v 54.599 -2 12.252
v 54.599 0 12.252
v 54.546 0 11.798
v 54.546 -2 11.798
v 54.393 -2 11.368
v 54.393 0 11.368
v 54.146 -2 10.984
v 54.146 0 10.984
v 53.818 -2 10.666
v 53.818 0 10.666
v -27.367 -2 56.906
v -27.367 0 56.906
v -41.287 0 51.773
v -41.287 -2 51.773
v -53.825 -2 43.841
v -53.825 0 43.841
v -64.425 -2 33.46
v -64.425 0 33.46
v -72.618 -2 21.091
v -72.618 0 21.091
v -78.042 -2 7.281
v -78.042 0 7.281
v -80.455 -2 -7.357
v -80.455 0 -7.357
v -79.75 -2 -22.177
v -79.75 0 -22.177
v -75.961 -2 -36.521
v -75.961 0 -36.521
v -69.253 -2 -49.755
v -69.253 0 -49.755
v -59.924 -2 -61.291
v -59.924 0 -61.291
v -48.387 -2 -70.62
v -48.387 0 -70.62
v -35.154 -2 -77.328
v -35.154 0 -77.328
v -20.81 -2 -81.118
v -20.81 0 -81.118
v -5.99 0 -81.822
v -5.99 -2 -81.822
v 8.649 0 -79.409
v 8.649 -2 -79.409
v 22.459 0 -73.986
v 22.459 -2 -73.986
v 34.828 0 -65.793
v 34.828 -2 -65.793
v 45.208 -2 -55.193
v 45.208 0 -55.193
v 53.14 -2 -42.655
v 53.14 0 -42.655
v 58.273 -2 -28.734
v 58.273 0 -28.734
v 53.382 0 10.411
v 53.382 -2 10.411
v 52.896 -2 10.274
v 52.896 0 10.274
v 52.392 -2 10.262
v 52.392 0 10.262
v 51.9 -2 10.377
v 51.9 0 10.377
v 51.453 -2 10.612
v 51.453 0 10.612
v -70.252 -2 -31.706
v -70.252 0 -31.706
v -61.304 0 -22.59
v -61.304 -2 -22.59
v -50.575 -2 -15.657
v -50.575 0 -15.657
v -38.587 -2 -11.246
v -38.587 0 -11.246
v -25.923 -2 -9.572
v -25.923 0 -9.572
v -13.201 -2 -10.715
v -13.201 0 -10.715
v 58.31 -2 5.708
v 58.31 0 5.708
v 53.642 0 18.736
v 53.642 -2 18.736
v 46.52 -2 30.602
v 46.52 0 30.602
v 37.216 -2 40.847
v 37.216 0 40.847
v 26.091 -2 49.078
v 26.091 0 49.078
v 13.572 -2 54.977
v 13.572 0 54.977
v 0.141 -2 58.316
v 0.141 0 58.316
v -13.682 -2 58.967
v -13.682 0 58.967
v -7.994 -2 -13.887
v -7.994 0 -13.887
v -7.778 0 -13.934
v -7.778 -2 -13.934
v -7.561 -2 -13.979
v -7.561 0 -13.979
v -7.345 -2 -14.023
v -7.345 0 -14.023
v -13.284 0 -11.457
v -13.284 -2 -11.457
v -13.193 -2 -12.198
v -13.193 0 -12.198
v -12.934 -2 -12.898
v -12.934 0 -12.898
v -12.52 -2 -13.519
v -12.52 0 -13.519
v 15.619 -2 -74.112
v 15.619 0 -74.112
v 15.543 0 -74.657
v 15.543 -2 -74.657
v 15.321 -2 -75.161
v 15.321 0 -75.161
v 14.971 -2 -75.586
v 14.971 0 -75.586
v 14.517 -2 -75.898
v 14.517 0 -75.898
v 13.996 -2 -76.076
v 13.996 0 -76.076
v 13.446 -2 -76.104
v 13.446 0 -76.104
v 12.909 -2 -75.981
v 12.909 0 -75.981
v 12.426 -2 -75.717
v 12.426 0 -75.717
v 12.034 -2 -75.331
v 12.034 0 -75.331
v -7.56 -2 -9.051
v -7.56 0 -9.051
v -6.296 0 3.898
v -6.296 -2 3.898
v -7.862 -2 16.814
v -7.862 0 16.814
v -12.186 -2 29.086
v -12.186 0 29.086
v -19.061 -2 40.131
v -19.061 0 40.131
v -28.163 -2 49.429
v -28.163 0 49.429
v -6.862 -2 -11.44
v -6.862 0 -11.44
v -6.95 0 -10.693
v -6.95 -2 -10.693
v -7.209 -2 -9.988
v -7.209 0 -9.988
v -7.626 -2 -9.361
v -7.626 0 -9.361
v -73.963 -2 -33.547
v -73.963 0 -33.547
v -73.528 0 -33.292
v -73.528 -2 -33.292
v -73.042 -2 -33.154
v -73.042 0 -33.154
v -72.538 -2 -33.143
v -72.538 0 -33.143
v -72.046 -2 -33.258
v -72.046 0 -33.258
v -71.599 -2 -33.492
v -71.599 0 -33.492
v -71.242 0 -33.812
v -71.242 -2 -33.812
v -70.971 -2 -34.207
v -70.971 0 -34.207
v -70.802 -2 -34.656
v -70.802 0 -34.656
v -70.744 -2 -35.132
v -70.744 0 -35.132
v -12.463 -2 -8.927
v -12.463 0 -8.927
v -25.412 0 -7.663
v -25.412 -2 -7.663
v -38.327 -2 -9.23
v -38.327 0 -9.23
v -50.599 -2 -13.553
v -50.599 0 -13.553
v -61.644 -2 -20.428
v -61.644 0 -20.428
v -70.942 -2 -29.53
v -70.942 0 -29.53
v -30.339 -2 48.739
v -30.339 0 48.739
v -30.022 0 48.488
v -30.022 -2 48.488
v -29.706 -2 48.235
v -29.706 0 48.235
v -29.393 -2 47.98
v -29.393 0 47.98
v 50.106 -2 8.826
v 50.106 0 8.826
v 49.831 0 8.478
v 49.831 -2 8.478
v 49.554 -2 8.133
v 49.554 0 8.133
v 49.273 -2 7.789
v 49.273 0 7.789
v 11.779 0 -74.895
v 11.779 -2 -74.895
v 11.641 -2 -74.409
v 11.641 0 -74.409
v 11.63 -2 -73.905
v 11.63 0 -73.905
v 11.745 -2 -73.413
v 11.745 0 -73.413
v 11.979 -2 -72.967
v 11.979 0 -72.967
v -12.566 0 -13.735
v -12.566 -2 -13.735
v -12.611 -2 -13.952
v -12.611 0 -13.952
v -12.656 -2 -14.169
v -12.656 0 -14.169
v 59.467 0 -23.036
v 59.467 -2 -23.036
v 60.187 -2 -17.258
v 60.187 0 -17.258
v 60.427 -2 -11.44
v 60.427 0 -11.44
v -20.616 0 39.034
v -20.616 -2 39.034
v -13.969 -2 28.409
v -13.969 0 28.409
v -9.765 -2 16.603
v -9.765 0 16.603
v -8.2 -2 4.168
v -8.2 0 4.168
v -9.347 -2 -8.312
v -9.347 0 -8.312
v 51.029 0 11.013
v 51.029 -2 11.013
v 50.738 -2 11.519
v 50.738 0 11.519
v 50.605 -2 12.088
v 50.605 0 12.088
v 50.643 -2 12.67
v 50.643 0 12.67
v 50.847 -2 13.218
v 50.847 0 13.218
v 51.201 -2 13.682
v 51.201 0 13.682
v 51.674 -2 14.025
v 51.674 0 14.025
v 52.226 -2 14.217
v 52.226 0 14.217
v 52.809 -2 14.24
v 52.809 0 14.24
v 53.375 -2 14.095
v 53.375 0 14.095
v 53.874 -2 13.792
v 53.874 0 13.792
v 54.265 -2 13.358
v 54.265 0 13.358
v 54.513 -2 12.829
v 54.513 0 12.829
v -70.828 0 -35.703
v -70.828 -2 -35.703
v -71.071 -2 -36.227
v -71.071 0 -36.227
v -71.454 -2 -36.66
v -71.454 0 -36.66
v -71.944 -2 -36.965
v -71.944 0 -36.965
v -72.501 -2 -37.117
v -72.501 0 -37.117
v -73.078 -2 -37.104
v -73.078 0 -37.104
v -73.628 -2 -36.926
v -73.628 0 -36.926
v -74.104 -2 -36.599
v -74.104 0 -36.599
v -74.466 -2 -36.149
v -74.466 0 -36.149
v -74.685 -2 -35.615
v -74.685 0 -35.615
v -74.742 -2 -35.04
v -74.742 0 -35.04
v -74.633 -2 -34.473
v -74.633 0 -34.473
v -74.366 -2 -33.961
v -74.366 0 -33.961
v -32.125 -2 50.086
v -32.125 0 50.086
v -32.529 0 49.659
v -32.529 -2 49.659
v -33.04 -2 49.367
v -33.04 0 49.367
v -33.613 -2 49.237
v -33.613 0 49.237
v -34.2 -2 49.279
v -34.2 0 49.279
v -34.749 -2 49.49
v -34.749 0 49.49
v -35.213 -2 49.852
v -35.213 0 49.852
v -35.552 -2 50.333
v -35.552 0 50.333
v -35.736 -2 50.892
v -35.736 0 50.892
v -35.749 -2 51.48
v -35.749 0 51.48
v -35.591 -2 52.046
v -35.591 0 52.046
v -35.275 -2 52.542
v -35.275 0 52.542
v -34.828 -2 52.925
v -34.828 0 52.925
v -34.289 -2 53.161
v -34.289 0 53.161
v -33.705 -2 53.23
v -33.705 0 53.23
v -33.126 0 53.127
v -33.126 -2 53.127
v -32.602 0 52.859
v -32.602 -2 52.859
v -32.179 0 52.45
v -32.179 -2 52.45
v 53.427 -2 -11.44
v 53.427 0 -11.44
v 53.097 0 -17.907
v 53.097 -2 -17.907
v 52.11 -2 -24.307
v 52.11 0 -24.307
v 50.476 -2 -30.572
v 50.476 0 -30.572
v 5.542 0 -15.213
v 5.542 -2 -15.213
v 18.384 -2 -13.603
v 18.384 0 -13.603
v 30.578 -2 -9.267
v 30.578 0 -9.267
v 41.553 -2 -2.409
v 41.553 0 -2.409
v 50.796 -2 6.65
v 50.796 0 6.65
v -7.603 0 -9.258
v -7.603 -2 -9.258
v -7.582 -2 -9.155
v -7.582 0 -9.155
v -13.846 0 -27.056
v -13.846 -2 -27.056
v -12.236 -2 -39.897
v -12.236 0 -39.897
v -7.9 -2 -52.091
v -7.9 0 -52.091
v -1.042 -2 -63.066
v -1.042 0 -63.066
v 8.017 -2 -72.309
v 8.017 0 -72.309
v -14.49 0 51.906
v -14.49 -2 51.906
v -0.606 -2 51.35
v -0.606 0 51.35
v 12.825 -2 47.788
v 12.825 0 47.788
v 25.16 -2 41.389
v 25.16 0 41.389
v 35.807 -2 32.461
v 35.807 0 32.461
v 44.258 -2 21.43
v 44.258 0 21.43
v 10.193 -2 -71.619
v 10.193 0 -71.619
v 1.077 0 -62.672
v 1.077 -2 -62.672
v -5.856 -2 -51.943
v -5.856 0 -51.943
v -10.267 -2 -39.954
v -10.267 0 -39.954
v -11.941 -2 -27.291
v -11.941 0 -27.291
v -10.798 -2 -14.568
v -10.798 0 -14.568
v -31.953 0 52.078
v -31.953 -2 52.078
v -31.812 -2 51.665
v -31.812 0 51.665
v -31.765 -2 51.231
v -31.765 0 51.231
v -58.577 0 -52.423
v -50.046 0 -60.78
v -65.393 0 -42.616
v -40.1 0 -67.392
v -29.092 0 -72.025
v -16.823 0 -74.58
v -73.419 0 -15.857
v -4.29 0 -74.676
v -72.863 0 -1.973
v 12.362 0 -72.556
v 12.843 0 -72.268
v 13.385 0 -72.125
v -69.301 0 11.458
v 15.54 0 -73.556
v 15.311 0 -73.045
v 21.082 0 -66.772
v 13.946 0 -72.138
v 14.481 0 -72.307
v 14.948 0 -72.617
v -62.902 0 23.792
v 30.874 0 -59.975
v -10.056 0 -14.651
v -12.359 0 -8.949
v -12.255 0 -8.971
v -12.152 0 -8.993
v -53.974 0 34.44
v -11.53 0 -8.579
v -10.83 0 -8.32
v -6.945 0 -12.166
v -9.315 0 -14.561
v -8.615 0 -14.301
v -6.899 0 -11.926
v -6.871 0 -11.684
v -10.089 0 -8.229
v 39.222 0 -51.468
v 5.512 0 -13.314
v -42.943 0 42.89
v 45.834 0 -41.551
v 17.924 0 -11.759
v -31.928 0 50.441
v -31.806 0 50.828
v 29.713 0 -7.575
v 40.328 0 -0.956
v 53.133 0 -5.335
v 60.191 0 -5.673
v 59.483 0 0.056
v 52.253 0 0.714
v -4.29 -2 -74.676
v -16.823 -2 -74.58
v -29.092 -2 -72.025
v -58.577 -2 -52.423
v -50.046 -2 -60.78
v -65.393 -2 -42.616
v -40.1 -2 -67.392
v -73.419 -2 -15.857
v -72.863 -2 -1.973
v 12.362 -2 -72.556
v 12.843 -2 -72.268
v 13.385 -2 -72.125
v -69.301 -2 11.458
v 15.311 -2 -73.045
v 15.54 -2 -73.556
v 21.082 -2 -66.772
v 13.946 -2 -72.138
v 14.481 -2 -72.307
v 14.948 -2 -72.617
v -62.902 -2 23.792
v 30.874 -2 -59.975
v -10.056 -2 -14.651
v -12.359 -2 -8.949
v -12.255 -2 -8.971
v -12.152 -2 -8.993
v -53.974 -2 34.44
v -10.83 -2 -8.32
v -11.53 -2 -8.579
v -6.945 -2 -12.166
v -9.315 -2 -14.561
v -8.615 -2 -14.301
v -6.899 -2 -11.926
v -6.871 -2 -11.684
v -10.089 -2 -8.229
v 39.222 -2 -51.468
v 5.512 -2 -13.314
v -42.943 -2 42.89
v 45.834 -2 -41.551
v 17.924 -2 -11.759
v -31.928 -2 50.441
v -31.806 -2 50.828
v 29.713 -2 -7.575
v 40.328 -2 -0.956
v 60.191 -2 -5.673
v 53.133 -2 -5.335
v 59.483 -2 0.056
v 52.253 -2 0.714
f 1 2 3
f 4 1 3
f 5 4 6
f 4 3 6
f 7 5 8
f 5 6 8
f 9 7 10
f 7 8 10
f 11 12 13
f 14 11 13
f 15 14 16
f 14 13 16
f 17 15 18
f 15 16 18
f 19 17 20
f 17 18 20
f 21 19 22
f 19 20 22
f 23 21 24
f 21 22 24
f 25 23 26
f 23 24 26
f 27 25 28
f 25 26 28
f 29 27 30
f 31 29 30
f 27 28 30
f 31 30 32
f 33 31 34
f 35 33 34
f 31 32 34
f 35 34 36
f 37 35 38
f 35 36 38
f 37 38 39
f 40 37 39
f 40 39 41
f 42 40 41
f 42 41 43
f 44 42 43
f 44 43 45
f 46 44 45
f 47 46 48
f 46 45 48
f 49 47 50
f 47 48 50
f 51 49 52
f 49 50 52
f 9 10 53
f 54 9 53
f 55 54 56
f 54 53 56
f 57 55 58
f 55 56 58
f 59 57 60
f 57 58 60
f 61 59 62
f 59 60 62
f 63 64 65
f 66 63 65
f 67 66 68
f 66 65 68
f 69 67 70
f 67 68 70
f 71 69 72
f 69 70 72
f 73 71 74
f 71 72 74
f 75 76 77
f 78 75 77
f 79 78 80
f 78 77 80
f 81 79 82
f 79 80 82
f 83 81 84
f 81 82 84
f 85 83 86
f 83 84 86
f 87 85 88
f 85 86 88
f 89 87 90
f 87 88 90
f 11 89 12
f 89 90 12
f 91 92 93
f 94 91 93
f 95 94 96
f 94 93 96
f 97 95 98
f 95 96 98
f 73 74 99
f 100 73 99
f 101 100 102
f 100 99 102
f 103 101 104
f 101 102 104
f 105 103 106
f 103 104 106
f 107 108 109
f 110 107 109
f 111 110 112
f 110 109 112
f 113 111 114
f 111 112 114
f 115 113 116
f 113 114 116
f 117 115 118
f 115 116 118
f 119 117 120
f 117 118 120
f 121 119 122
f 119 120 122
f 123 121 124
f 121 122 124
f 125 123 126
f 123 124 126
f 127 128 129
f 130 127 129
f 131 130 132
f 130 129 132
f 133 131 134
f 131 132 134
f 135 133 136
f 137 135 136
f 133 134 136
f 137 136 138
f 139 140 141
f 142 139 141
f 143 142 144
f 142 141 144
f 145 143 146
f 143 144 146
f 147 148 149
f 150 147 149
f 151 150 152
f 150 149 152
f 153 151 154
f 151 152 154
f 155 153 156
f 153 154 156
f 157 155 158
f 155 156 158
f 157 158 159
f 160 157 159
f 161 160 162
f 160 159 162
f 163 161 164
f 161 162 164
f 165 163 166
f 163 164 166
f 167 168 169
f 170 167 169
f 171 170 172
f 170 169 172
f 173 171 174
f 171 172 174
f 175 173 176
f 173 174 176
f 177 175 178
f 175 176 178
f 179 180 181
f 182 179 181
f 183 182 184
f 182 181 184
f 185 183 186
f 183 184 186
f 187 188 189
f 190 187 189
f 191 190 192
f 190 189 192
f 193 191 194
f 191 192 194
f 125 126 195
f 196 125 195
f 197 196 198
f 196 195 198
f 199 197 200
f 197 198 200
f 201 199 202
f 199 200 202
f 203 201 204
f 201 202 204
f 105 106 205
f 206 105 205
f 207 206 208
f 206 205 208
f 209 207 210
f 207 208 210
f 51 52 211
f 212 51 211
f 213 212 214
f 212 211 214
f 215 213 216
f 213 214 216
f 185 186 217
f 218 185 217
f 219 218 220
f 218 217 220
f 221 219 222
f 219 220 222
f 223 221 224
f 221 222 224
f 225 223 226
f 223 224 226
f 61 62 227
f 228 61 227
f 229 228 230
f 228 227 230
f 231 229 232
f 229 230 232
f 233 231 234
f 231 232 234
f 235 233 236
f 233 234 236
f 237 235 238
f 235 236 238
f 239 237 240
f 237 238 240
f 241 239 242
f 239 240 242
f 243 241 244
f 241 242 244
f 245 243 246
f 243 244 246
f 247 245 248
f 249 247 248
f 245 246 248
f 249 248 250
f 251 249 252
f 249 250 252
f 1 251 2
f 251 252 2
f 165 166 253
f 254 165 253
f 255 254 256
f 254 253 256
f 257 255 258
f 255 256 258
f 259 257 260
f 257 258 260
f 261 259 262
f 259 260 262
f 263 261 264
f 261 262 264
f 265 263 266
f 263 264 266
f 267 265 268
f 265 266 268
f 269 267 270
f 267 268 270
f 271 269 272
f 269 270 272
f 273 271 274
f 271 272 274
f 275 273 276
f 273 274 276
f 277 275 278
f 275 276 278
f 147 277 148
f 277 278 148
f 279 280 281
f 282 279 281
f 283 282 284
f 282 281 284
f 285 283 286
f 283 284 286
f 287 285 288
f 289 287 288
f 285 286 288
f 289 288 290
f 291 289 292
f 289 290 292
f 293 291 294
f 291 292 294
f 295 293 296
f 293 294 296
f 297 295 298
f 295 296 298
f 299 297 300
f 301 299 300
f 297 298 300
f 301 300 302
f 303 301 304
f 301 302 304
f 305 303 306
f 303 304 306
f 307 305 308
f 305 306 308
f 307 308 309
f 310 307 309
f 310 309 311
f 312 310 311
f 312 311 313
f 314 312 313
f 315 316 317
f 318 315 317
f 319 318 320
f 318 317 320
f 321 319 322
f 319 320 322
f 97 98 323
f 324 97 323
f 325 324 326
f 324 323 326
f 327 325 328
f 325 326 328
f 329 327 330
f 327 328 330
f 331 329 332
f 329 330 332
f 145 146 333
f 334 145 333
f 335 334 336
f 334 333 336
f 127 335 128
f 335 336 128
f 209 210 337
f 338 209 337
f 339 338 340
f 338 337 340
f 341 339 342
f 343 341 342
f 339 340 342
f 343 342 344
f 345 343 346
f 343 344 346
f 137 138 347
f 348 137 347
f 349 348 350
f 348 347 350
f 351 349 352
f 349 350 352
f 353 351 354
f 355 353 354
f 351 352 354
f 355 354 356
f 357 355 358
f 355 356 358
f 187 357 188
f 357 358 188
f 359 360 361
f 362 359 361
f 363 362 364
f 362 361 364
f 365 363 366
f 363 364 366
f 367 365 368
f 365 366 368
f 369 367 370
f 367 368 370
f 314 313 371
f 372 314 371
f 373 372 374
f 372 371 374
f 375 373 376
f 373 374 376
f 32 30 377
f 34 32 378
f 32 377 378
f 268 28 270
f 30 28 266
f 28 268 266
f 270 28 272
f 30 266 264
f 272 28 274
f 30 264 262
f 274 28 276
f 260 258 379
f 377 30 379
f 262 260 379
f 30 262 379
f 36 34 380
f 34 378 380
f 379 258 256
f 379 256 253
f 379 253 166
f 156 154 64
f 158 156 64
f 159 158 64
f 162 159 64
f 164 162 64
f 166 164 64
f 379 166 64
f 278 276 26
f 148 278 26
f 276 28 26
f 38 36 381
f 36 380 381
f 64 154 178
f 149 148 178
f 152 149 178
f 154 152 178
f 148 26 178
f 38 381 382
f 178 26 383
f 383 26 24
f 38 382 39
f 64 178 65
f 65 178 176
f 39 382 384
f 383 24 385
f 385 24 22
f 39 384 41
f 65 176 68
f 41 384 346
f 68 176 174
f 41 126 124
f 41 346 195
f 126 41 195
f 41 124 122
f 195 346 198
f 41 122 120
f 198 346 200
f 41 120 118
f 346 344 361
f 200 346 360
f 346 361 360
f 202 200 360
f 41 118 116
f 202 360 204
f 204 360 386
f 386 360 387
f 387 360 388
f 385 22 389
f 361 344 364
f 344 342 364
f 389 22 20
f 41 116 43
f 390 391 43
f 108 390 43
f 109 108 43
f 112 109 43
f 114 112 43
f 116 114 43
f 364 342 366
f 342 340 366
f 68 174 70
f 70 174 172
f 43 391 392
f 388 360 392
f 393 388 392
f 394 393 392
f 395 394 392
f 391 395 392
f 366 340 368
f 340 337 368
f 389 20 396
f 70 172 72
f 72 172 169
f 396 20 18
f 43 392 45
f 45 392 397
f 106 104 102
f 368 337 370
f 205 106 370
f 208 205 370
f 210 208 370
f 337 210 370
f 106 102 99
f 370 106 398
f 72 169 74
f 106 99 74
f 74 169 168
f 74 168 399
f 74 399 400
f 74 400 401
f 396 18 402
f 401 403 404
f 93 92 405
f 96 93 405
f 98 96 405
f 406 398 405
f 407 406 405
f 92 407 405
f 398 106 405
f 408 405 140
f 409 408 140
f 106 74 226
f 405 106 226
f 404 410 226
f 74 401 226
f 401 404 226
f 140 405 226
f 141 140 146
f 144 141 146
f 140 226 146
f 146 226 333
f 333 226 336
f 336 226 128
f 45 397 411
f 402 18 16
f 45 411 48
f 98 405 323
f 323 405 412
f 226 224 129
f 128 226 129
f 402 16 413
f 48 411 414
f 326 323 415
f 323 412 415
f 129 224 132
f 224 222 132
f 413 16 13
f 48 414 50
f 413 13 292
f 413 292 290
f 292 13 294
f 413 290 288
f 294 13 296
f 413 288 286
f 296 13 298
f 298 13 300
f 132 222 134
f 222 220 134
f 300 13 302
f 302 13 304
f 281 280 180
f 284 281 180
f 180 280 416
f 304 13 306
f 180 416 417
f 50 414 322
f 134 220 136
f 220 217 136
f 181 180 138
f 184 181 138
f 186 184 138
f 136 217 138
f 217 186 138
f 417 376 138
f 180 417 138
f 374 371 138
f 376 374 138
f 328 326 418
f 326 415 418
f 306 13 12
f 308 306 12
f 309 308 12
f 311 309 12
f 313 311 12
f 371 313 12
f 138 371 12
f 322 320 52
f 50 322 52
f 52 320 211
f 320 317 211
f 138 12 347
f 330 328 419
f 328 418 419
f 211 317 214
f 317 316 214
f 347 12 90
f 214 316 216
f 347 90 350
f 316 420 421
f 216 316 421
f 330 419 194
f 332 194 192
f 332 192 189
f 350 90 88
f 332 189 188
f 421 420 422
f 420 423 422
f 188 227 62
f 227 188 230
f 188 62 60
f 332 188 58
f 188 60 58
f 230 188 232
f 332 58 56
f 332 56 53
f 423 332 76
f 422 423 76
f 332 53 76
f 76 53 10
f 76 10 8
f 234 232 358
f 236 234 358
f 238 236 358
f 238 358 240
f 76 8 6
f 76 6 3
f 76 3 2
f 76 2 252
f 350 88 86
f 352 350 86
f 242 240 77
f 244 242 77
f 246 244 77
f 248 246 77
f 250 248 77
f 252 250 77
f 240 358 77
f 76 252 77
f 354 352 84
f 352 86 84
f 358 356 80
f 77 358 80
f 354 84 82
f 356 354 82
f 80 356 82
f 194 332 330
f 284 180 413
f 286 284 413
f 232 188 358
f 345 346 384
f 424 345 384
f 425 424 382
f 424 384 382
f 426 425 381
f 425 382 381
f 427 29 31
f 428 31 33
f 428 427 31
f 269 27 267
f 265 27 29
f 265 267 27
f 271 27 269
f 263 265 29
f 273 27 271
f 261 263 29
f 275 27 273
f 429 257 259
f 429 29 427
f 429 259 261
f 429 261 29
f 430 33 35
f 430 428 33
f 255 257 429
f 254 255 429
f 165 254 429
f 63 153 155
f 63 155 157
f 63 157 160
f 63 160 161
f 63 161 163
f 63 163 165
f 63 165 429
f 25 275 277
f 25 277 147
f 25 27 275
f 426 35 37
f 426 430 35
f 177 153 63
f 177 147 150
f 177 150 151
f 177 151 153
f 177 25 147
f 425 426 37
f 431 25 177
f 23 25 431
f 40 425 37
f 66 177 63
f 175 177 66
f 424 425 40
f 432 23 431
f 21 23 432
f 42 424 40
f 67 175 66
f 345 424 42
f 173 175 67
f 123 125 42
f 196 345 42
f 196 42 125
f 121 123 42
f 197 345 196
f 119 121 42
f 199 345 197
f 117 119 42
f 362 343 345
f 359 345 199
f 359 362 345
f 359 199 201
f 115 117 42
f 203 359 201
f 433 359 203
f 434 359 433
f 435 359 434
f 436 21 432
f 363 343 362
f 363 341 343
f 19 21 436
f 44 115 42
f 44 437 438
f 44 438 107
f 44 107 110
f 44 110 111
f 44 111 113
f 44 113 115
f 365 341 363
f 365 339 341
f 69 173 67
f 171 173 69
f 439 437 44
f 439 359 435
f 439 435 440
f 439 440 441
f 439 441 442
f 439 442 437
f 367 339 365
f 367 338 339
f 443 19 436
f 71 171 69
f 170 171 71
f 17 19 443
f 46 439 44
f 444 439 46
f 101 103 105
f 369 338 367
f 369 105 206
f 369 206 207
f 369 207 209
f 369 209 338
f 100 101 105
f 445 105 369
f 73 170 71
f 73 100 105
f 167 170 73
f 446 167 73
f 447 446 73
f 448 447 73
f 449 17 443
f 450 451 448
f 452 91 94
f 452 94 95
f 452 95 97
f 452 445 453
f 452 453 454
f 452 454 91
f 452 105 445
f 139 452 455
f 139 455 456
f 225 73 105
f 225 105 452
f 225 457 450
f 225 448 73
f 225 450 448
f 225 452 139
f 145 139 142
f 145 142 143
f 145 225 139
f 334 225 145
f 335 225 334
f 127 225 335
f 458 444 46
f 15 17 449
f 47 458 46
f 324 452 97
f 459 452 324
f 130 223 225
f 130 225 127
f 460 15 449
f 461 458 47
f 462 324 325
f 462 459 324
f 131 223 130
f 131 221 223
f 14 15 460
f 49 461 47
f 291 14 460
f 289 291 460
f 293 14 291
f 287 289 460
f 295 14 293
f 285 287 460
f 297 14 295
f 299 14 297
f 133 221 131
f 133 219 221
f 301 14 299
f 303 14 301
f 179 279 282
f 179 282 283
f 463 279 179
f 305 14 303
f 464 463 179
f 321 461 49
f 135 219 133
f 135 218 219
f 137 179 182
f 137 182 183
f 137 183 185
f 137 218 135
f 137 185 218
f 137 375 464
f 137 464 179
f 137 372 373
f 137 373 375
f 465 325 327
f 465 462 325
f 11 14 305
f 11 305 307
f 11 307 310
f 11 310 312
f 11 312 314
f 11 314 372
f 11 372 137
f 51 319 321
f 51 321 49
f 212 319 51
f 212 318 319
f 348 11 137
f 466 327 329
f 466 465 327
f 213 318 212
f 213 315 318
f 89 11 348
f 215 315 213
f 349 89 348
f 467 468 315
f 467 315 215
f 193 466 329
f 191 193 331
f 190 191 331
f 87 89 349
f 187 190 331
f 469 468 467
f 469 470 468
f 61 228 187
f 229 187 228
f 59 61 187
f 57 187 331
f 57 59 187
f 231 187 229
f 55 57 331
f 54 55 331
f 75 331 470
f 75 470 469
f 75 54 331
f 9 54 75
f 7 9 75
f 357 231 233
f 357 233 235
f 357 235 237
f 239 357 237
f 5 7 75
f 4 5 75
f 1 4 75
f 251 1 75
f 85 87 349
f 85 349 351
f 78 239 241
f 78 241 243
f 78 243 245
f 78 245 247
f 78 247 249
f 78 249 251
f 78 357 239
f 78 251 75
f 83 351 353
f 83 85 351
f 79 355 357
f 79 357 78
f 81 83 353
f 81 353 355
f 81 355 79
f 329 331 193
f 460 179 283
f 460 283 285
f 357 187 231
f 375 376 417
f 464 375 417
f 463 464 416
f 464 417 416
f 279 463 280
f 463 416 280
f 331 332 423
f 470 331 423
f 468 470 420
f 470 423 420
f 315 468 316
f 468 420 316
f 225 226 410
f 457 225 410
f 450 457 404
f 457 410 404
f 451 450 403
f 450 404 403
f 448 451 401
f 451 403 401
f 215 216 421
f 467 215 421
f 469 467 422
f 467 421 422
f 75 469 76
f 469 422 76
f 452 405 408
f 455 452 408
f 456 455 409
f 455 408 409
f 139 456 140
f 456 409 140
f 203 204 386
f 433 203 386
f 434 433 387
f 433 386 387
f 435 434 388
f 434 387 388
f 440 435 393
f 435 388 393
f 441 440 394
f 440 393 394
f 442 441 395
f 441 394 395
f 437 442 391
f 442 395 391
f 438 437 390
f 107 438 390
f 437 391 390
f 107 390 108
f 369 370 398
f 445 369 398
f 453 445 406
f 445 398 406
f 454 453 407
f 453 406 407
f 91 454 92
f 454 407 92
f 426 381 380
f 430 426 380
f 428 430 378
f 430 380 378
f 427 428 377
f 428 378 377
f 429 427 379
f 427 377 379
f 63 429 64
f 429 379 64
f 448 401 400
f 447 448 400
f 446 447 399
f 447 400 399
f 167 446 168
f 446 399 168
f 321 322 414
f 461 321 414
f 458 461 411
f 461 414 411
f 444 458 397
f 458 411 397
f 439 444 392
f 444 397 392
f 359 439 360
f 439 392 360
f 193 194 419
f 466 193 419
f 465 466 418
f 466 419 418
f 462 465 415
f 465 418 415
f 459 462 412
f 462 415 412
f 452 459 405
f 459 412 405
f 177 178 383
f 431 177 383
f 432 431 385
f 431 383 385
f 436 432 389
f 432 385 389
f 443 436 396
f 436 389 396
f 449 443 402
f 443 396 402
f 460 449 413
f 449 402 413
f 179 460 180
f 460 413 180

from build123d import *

# Parameters (mm, degrees)
F1_DEPTH = 2


# Not quite as in the source:
# - a feature names something its author has since deleted; it is built from what else it names


with BuildPart() as f1:
    # F0 (on Front) → F1 (new body)
    with BuildSketch(Plane.XZ):
        with BuildLine():
            ThreePointArc((-27.3670955133, 56.9056551345), (-80.5728095325, -11.5155179666), (-27.2210675465, -79.822886236))
            ThreePointArc((-27.2210675465, -79.822886236), (-28.2707166424, -75.9512965825), (-29.0922663621, -72.0249718726))
            ThreePointArc((-29.0922663621, -72.0249718726), (-54.5082769695, -56.802573142), (-70.2520814599, -31.7062061045))
            ThreePointArc((-70.2520814599, -31.7062061045), (-70.6313699985, -32.1947433172), (-71.0054179832, -32.6873044899))
            ThreePointArc((-71.0054179832, -32.6873044899), (-70.0780888504, -33.7565825815), (-69.7442063574, -35.1320161272))
            ThreePointArc((-69.7442063574, -35.1320161272), (-74.7859973818, -37.3299900608), (-72.9649326324, -32.1401471609))
            ThreePointArc((-72.9649326324, -32.1401471609), (-71.9713178078, -30.821081237), (-70.9416554734, -29.5299573821))
            ThreePointArc((-70.9416554734, -29.5299573821), (-66.4396950536, 17.8006515976), (-30.3388328071, 48.7390086816))
            ThreePointArc((-30.3388328071, 48.7390086816), (-30.8273700198, 49.1182972202), (-31.3199311925, 49.4923452049))
            ThreePointArc((-31.3199311925, 49.4923452049), (-36.6541110474, 52.0379628175), (-30.7727738636, 51.4518598542))
            ThreePointArc((-30.7727738636, 51.4518598542), (-29.8904735112, 50.7935939017), (-29.0204405195, 50.1191974536))
            ThreePointArc((-29.0204405195, 50.1191974536), (-28.2798956872, 53.5334090749), (-27.3670955133, 56.9056551345))
        make_face()
        with BuildLine():
            ThreePointArc((-29.0922663621, -72.0249718726), (-28.2707166424, -75.9512965825), (-27.2210675465, -79.822886236))
            ThreePointArc((-27.2210675465, -79.822886236), (26.0907604983, -71.958346724), (58.2730284319, -28.7344688106))
            ThreePointArc((58.2730284319, -28.7344688106), (54.4014575958, -29.7669456779), (50.4763758376, -30.5724283969))
            ThreePointArc((50.4763758376, -30.5724283969), (35.2481065637, -55.9178682056), (10.1931333262, -71.6194547573))
            ThreePointArc((10.1931333262, -71.6194547573), (10.6816705389, -71.9987432958), (11.1742317116, -72.3727912805))
            ThreePointArc((11.1742317116, -72.3727912805), (14.5315947304, -71.2537714989), (16.6189433489, -74.1115796548))
            ThreePointArc((16.6189433489, -74.1115796548), (13.7293813431, -77.1095462072), (10.6270743826, -74.3323059298))
            ThreePointArc((10.6270743826, -74.3323059298), (9.3080084587, -73.3386911051), (8.0168846038, -72.3090287708))
            ThreePointArc((8.0168846038, -72.3090287708), (-10.5589046392, -74.9383627794), (-29.0922663621, -72.0249718726))
        make_face()
        with BuildLine():
            ThreePointArc((58.3098134577, 5.7079947682), (26.0907604983, 49.0779006484), (-27.3670955133, 56.9056551345))
            ThreePointArc((-27.3670955133, 56.9056551345), (-28.2798956872, 53.5334090749), (-29.0204405195, 50.1191974536))
            ThreePointArc((-29.0204405195, 50.1191974536), (-28.589922312, 49.7758651019), (-28.1625840847, 49.4285826951))
            ThreePointArc((-28.1625840847, 49.4285826951), (19.1680248949, 44.9266222753), (50.106381979, 8.8257600288))
            ThreePointArc((50.106381979, 8.8257600288), (50.4856705176, 9.3142972415), (50.8597185023, 9.8068584143))
            ThreePointArc((50.8597185023, 9.8068584143), (51.2230733308, 14.9176875586), (55.5985068765, 12.2515700516))
            ThreePointArc((55.5985068765, 12.2515700516), (54.79648081, 10.2097790271), (52.8192331515, 9.2597010853))
            ThreePointArc((52.8192331515, 9.2597010853), (52.1241754763, 8.329073827), (51.4111721259, 7.4121231804))
            ThreePointArc((51.4111721259, 7.4121231804), (54.8825742735, 6.6494490821), (58.3098134577, 5.7079947682))
        make_face()
        with BuildLine():
            ThreePointArc((50.4763758376, -30.5724283969), (54.4014575958, -29.7669456779), (58.2730284319, -28.7344688106))
            ThreePointArc((58.2730284319, -28.7344688106), (59.886547095, -20.1541655683), (60.4271502595, -11.4402230378))
            ThreePointArc((60.4271502595, -11.4402230378), (59.8958138007, -2.8010030346), (58.3098134577, 5.7079947682))
            ThreePointArc((58.3098134577, 5.7079947682), (54.8825742735, 6.6494490821), (51.4111721259, 7.4121231804))
            ThreePointArc((51.4111721259, 7.4121231804), (51.1051261442, 7.0295570743), (50.7959559925, 6.6495113064))
            ThreePointArc((50.7959559925, 6.6495113064), (52.7659088566, -2.3001782907), (53.4271502595, -11.4402230378))
            ThreePointArc((53.4271502595, -11.4402230378), (52.6851211645, -21.1194320912), (50.4763758376, -30.5724283969))
        make_face()
        with BuildLine():
            ThreePointArc((-12.5201116119, -13.51897209), (-12.5889413468, -13.8437334785), (-12.6559669985, -14.1688719933))
            ThreePointArc((-12.6559669985, -14.1688719933), (-12.4731783685, -13.96568891), (-12.2895816621, -13.7632357104))
            ThreePointArc((-12.2895816621, -13.7632357104), (-12.4080426029, -13.6441201736), (-12.5201116119, -13.51897209))
        make_face()
        with BuildLine():
            ThreePointArc((-12.2895816621, -13.7632357104), (-12.4731783685, -13.96568891), (-12.6559669985, -14.1688719933))
            ThreePointArc((-12.6559669985, -14.1688719933), (-10.3985570941, -46.1115999582), (8.0168846038, -72.3090287708))
            ThreePointArc((8.0168846038, -72.3090287708), (9.1081080721, -71.9740223354), (10.1931333262, -71.6194547573))
            ThreePointArc((10.1931333262, -71.6194547573), (-8.3929341527, -46.0705747238), (-10.7982724135, -14.5681696862))
            ThreePointArc((-10.7982724135, -14.5681696862), (-11.5979884526, -14.2658628235), (-12.2895816621, -13.7632357104))
        make_face()
        with BuildLine():
            ThreePointArc((-70.9416554734, -29.5299573821), (-70.606649038, -30.6211808503), (-70.2520814599, -31.7062061045))
            ThreePointArc((-70.2520814599, -31.7062061045), (-44.7032014264, -13.1201386255), (-13.2007963888, -10.7148003648))
            ThreePointArc((-13.2007963888, -10.7148003648), (-12.862086438, -9.8494851792), (-12.2897757069, -9.1173955477))
            ThreePointArc((-12.2897757069, -9.1173955477), (-12.3762338407, -9.022292149), (-12.4625142647, -8.9270274978))
            ThreePointArc((-12.4625142647, -8.9270274978), (-44.5810834921, -11.0567727884), (-70.9416554734, -29.5299573821))
        make_face()
        with BuildLine():
            ThreePointArc((-71.0054179832, -32.6873044899), (-70.6313699985, -32.1947433172), (-70.2520814599, -31.7062061045))
            ThreePointArc((-70.2520814599, -31.7062061045), (-70.606649038, -30.6211808503), (-70.9416554734, -29.5299573821))
            ThreePointArc((-70.9416554734, -29.5299573821), (-71.9713178078, -30.821081237), (-72.9649326324, -32.1401471609))
            ThreePointArc((-72.9649326324, -32.1401471609), (-71.937377119, -32.2425479097), (-71.0054179832, -32.6873044899))
        make_face()
        with BuildLine():
            ThreePointArc((10.1931333262, -71.6194547573), (9.1081080721, -71.9740223354), (8.0168846038, -72.3090287708))
            ThreePointArc((8.0168846038, -72.3090287708), (9.3080084587, -73.3386911051), (10.6270743826, -74.3323059298))
            ThreePointArc((10.6270743826, -74.3323059298), (10.7294751314, -73.3047504164), (11.1742317116, -72.3727912805))
            ThreePointArc((11.1742317116, -72.3727912805), (10.6816705389, -71.9987432958), (10.1931333262, -71.6194547573))
        make_face()
        with BuildLine():
            ThreePointArc((-28.1625840847, 49.4285826951), (-28.589922312, 49.7758651019), (-29.0204405195, 50.1191974536))
            ThreePointArc((-29.0204405195, 50.1191974536), (-29.1146314874, 49.6144442417), (-29.2050550996, 49.1090025402))
            ThreePointArc((-29.2050550996, 49.1090025402), (-28.6845055424, 49.2710301885), (-28.1625840847, 49.4285826951))
        make_face()
        with BuildLine():
            ThreePointArc((-29.2050550996, 49.1090025402), (-29.1146314874, 49.6144442417), (-29.0204405195, 50.1191974536))
            ThreePointArc((-29.0204405195, 50.1191974536), (-29.8904735112, 50.7935939017), (-30.7727738636, 51.4518598542))
            ThreePointArc((-30.7727738636, 51.4518598542), (-30.7666762774, 51.3415715733), (-30.7646428299, 51.2311335791))
            ThreePointArc((-30.7646428299, 51.2311335791), (-30.9068346739, 50.3184821977), (-31.3199311925, 49.4923452049))
            ThreePointArc((-31.3199311925, 49.4923452049), (-30.8273700198, 49.1182972202), (-30.3388328071, 48.7390086816))
            ThreePointArc((-30.3388328071, 48.7390086816), (-29.7728126001, 48.9266674182), (-29.2050550996, 49.1090025402))
        make_face()
        with BuildLine():
            ThreePointArc((50.7959559925, 6.6495113064), (51.1051261442, 7.0295570743), (51.4111721259, 7.4121231804))
            ThreePointArc((51.4111721259, 7.4121231804), (50.9618140768, 7.4971572567), (50.5118990943, 7.5791935838))
            ThreePointArc((50.5118990943, 7.5791935838), (50.6557066113, 7.1148960249), (50.7959559925, 6.6495113064))
        make_face()
        with BuildLine():
            ThreePointArc((50.5118990943, 7.5791935838), (50.9618140768, 7.4971572567), (51.4111721259, 7.4121231804))
            ThreePointArc((51.4111721259, 7.4121231804), (52.1241754763, 8.329073827), (52.8192331515, 9.2597010853))
            ThreePointArc((52.8192331515, 9.2597010853), (51.7916776381, 9.362101834), (50.8597185023, 9.8068584143))
            ThreePointArc((50.8597185023, 9.8068584143), (50.4856705176, 9.3142972415), (50.106381979, 8.8257600288))
            ThreePointArc((50.106381979, 8.8257600288), (50.3123573205, 8.2035232495), (50.5118990943, 7.5791935838))
        make_face()
        with BuildLine():
            ThreePointArc((-12.5201116119, -13.51897209), (-12.4080426029, -13.6441201736), (-12.2895816621, -13.7632357104))
            ThreePointArc((-12.2895816621, -13.7632357104), (-11.1948099524, -12.5887570771), (-10.0728497405, -11.4402230378))
            ThreePointArc((-10.0728497405, -11.4402230378), (-10.9940718567, -11.2075300608), (-11.9189886514, -10.9899866588))
            ThreePointArc((-11.9189886514, -10.9899866588), (-12.2332943861, -12.2512124569), (-12.5201116119, -13.51897209))
        make_face()
        with BuildLine():
            ThreePointArc((-10.0728497405, -11.4402230378), (-11.1948099524, -12.5887570771), (-12.2895816621, -13.7632357104))
            ThreePointArc((-12.2895816621, -13.7632357104), (-11.5979884526, -14.2658628235), (-10.7982724135, -14.5681696862))
            ThreePointArc((-10.7982724135, -14.5681696862), (-10.6643076305, -13.9264868582), (-10.5230861195, -13.2863619488))
            ThreePointArc((-10.5230861195, -13.2863619488), (-10.5381735464, -13.2824253135), (-10.5532599463, -13.2784847442))
            Line((-10.5532599463, -13.2784847442), (-10.0728497405, -11.4402230378))
        make_face()
        with BuildLine():
            ThreePointArc((-13.2007963888, -10.7148003648), (-13.1931994446, -12.1976568722), (-12.5201116119, -13.51897209))
            ThreePointArc((-12.5201116119, -13.51897209), (-12.2332943861, -12.2512124569), (-11.9189886514, -10.9899866588))
            ThreePointArc((-11.9189886514, -10.9899866588), (-12.5591135608, -10.8487651478), (-13.2007963888, -10.7148003648))
        make_face()
        with BuildLine():
            ThreePointArc((-12.2897757069, -9.1173955477), (-12.862086438, -9.8494851792), (-13.2007963888, -10.7148003648))
            ThreePointArc((-13.2007963888, -10.7148003648), (-12.5591135608, -10.8487651478), (-11.9189886514, -10.9899866588))
            ThreePointArc((-11.9189886514, -10.9899866588), (-11.9150520162, -10.9748992319), (-11.9111114468, -10.9598128319))
            Line((-11.9111114468, -10.9598128319), (-10.0728497405, -11.4402230378))
            ThreePointArc((-10.0728497405, -11.4402230378), (-11.1948573752, -10.2917364213), (-12.2897757069, -9.1173955477))
        make_face()
        with BuildLine():
            ThreePointArc((-69.7442063574, -35.1320161272), (-70.0780888504, -33.7565825815), (-71.0054179832, -32.6873044899))
            ThreePointArc((-71.0054179832, -32.6873044899), (-71.3040153489, -33.088497971), (-71.5991359801, -33.4922558304))
            ThreePointArc((-71.5991359801, -33.4922558304), (-70.9707717301, -34.2073920832), (-70.7442063574, -35.1320161272))
            ThreePointArc((-70.7442063574, -35.1320161272), (-73.6278272269, -36.9262329923), (-73.9634205165, -33.5466086609))
            ThreePointArc((-73.9634205165, -33.5466086609), (-73.469248174, -32.839777435), (-72.9649326324, -32.1401471609))
            ThreePointArc((-72.9649326324, -32.1401471609), (-74.7859973818, -37.3299900608), (-69.7442063574, -35.1320161272))
        make_face()
        with BuildLine():
            ThreePointArc((-71.5991359801, -33.4922558304), (-71.3040153489, -33.088497971), (-71.0054179832, -32.6873044899))
            ThreePointArc((-71.0054179832, -32.6873044899), (-71.937377119, -32.2425479097), (-72.9649326324, -32.1401471609))
            ThreePointArc((-72.9649326324, -32.1401471609), (-73.469248174, -32.839777435), (-73.9634205165, -33.5466086609))
            ThreePointArc((-73.9634205165, -33.5466086609), (-72.7901724606, -33.1325444177), (-71.5991359801, -33.4922558304))
        make_face()
        with BuildLine():
            ThreePointArc((11.1742317116, -72.3727912805), (10.7294751314, -73.3047504164), (10.6270743826, -74.3323059298))
            ThreePointArc((10.6270743826, -74.3323059298), (11.3267046567, -74.8366214714), (12.0335358826, -75.3307938138))
            ThreePointArc((12.0335358826, -75.3307938138), (11.6194716394, -74.1575457579), (11.9791830521, -72.9665092775))
            ThreePointArc((11.9791830521, -72.9665092775), (11.5754251927, -72.6713886463), (11.1742317116, -72.3727912805))
        make_face()
        with BuildLine():
            ThreePointArc((12.0335358826, -75.3307938138), (11.3267046567, -74.8366214714), (10.6270743826, -74.3323059298))
            ThreePointArc((10.6270743826, -74.3323059298), (13.7293813431, -77.1095462072), (16.6189433489, -74.1115796548))
            ThreePointArc((16.6189433489, -74.1115796548), (14.5315947304, -71.2537714989), (11.1742317116, -72.3727912805))
            ThreePointArc((11.1742317116, -72.3727912805), (11.5754251927, -72.6713886463), (11.9791830521, -72.9665092775))
            ThreePointArc((11.9791830521, -72.9665092775), (14.2191430683, -72.2037640723), (15.6189433489, -74.1115796548))
            ThreePointArc((15.6189433489, -74.1115796548), (14.2628319524, -76.0050968758), (12.0335358826, -75.3307938138))
        make_face()
        with BuildLine():
            ThreePointArc((-28.1625840847, 49.4285826951), (-28.6845055424, 49.2710301885), (-29.2050550996, 49.1090025402))
            ThreePointArc((-29.2050550996, 49.1090025402), (-29.3013575877, 48.545087408), (-29.3929706411, 47.9803914774))
            ThreePointArc((-29.3929706411, 47.9803914774), (-11.5464019221, 22.6200733478), (-9.3474270674, -8.3122763895))
            ThreePointArc((-9.3474270674, -8.3122763895), (-8.4819953839, -8.6510527838), (-7.7498370678, -9.2234911162))
            ThreePointArc((-7.7498370678, -9.2234911162), (-7.6548806672, -9.1371958925), (-7.5597630163, -9.051078437))
            ThreePointArc((-7.5597630163, -9.051078437), (-9.6893112365, 23.0677602114), (-28.1625840847, 49.4285826951))
        make_face()
        with BuildLine():
            ThreePointArc((-29.3929706411, 47.9803914774), (-29.3013575877, 48.545087408), (-29.2050550996, 49.1090025402))
            ThreePointArc((-29.2050550996, 49.1090025402), (-29.7728126001, 48.9266674182), (-30.3388328071, 48.7390086816))
            ThreePointArc((-30.3388328071, 48.7390086816), (-29.8639157079, 48.3621762923), (-29.3929706411, 47.9803914774))
        make_face()
        with BuildLine():
            ThreePointArc((-30.7646428299, 51.2311335791), (-30.7666762774, 51.3415715733), (-30.7727738636, 51.4518598542))
            ThreePointArc((-30.7727738636, 51.4518598542), (-31.4724041376, 51.9561753958), (-32.1792353635, 52.4503477382))
            ThreePointArc((-32.1792353635, 52.4503477382), (-31.8711256088, 51.8750221826), (-31.7646428299, 51.2311335791))
            ThreePointArc((-31.7646428299, 51.2311335791), (-31.8568272474, 50.6309338597), (-32.124882533, 50.0860632018))
            ThreePointArc((-32.124882533, 50.0860632018), (-31.7211246736, 49.7909425706), (-31.3199311925, 49.4923452049))
            ThreePointArc((-31.3199311925, 49.4923452049), (-30.9068346739, 50.3184821977), (-30.7646428299, 51.2311335791))
        make_face()
        with BuildLine():
            ThreePointArc((-32.1792353635, 52.4503477382), (-31.4724041376, 51.9561753958), (-30.7727738636, 51.4518598542))
            ThreePointArc((-30.7727738636, 51.4518598542), (-36.6541110474, 52.0379628175), (-31.3199311925, 49.4923452049))
            ThreePointArc((-31.3199311925, 49.4923452049), (-31.7211246736, 49.7909425706), (-32.124882533, 50.0860632018))
            ThreePointArc((-32.124882533, 50.0860632018), (-35.7641145394, 51.185167476), (-32.1792353635, 52.4503477382))
        make_face()
        with BuildLine():
            ThreePointArc((-7.9941006882, -13.8874849093), (-7.6696946098, -13.9562403689), (-7.3449122183, -14.0231956907))
            ThreePointArc((-7.3449122183, -14.0231956907), (-7.5478301275, -13.8405739674), (-7.7500222504, -13.6571490043))
            ThreePointArc((-7.7500222504, -13.6571490043), (-7.8690501416, -13.7755079493), (-7.9941006882, -13.8874849093))
        make_face()
        with BuildLine():
            ThreePointArc((-7.7500222504, -13.6571490043), (-7.5478301275, -13.8405739674), (-7.3449122183, -14.0231956907))
            ThreePointArc((-7.3449122183, -14.0231956907), (24.5981851662, -11.7660519999), (50.7959559925, 6.6495113064))
            ThreePointArc((50.7959559925, 6.6495113064), (50.6557066113, 7.1148960249), (50.5118990943, 7.5791935838))
            ThreePointArc((50.5118990943, 7.5791935838), (49.8930363162, 7.6869831447), (49.2732124019, 7.7891009341))
            ThreePointArc((49.2732124019, 7.7891009341), (23.9320992091, -9.9863481746), (-6.9449030921, -12.1656457109))
            ThreePointArc((-6.9449030921, -12.1656457109), (-7.2472736584, -12.9654797683), (-7.7500222504, -13.6571490043))
        make_face()
        with BuildLine():
            ThreePointArc((49.2732124019, 7.7891009341), (49.8930363162, 7.6869831447), (50.5118990943, 7.5791935838))
            ThreePointArc((50.5118990943, 7.5791935838), (50.3123573205, 8.2035232495), (50.106381979, 8.8257600288))
            ThreePointArc((50.106381979, 8.8257600288), (49.6927740639, 8.3050379491), (49.2732124019, 7.7891009341))
        make_face()
        with BuildLine():
            ThreePointArc((50.8597185023, 9.8068584143), (51.7916776381, 9.362101834), (52.8192331515, 9.2597010853))
            ThreePointArc((52.8192331515, 9.2597010853), (53.0275327482, 9.5460981807), (53.2341325227, 9.8337238948))
            ThreePointArc((53.2341325227, 9.8337238948), (52.1548181767, 9.7912569947), (51.1583297131, 10.2080706662))
            ThreePointArc((51.1583297131, 10.2080706662), (51.0094573534, 10.0071420874), (50.8597185023, 9.8068584143))
        make_face()
        with BuildLine():
            ThreePointArc((53.2341325227, 9.8337238948), (53.0275327482, 9.5460981807), (52.8192331515, 9.2597010853))
            ThreePointArc((52.8192331515, 9.2597010853), (54.79648081, 10.2097790271), (55.5985068765, 12.2515700516))
            ThreePointArc((55.5985068765, 12.2515700516), (51.2230733308, 14.9176875586), (50.8597185023, 9.8068584143))
            ThreePointArc((50.8597185023, 9.8068584143), (51.0094573534, 10.0071420874), (51.1583297131, 10.2080706662))
            ThreePointArc((51.1583297131, 10.2080706662), (51.4475166308, 14.4708540474), (55.0985068765, 12.2515700516))
            ThreePointArc((55.0985068765, 12.2515700516), (54.578287687, 10.7249830274), (53.2341325227, 9.8337238948))
        make_face()
        with BuildLine():
            Line((-9.5924395346, -9.6019613315), (-10.0728497405, -11.4402230378))
            ThreePointArc((-10.0728497405, -11.4402230378), (-8.9243157011, -10.3182628259), (-7.7498370678, -9.2234911162))
            ThreePointArc((-7.7498370678, -9.2234911162), (-8.4819953839, -8.6510527838), (-9.3474270674, -8.3122763895))
            ThreePointArc((-9.3474270674, -8.3122763895), (-9.4813918505, -8.9539592174), (-9.6226133615, -9.5940841269))
            ThreePointArc((-9.6226133615, -9.5940841269), (-9.6075259345, -9.5980207621), (-9.5924395346, -9.6019613315))
        make_face()
        with BuildLine():
            Line((-8.2345880341, -11.9206332437), (-10.0728497405, -11.4402230378))
            ThreePointArc((-10.0728497405, -11.4402230378), (-8.924363124, -12.5622306726), (-7.7500222504, -13.6571490043))
            ThreePointArc((-7.7500222504, -13.6571490043), (-7.2472736584, -12.9654797683), (-6.9449030921, -12.1656457109))
            ThreePointArc((-6.9449030921, -12.1656457109), (-7.5865859201, -12.0316809278), (-8.2267108295, -11.8904594168))
            ThreePointArc((-8.2267108295, -11.8904594168), (-8.2306474647, -11.9055468438), (-8.2345880341, -11.9206332437))
        make_face()
        with BuildLine():
            ThreePointArc((-7.7498370678, -9.2234911162), (-8.9243157011, -10.3182628259), (-10.0728497405, -11.4402230378))
            ThreePointArc((-10.0728497405, -11.4402230378), (-9.1516276243, -11.6729160149), (-8.2267108295, -11.8904594168))
            ThreePointArc((-8.2267108295, -11.8904594168), (-7.9124050948, -10.6292336188), (-7.625587869, -9.3614739856))
            ThreePointArc((-7.625587869, -9.3614739856), (-7.686714869, -9.2915842443), (-7.7498370678, -9.2234911162))
        make_face()
        with BuildLine():
            ThreePointArc((-10.5230861195, -13.2863619488), (-10.3055427175, -12.361445154), (-10.0728497405, -11.4402230378))
            Line((-10.0728497405, -11.4402230378), (-10.5532599463, -13.2784847442))
            ThreePointArc((-10.5532599463, -13.2784847442), (-10.5381735464, -13.2824253135), (-10.5230861195, -13.2863619488))
        make_face()
        with BuildLine():
            ThreePointArc((-12.2897757069, -9.1173955477), (-11.1948573752, -10.2917364213), (-10.0728497405, -11.4402230378))
            ThreePointArc((-10.0728497405, -11.4402230378), (-9.8401567634, -10.5190009216), (-9.6226133615, -9.5940841269))
            ThreePointArc((-9.6226133615, -9.5940841269), (-10.8838391595, -9.2797783922), (-12.1515987927, -8.9929611664))
            ThreePointArc((-12.1515987927, -8.9929611664), (-12.2215881949, -9.0541779116), (-12.2897757069, -9.1173955477))
        make_face()
        with BuildLine():
            ThreePointArc((-8.2267108295, -11.8904594168), (-9.1516276243, -11.6729160149), (-10.0728497405, -11.4402230378))
            Line((-10.0728497405, -11.4402230378), (-8.2345880341, -11.9206332437))
            ThreePointArc((-8.2345880341, -11.9206332437), (-8.2306474647, -11.9055468438), (-8.2267108295, -11.8904594168))
        make_face()
        with BuildLine():
            ThreePointArc((-9.6226133615, -9.5940841269), (-9.8401567634, -10.5190009216), (-10.0728497405, -11.4402230378))
            Line((-10.0728497405, -11.4402230378), (-9.5924395346, -9.6019613315))
            ThreePointArc((-9.5924395346, -9.6019613315), (-9.6075259345, -9.5980207621), (-9.6226133615, -9.5940841269))
        make_face()
        with BuildLine():
            ThreePointArc((-7.7500222504, -13.6571490043), (-8.924363124, -12.5622306726), (-10.0728497405, -11.4402230378))
            ThreePointArc((-10.0728497405, -11.4402230378), (-10.3055427175, -12.361445154), (-10.5230861195, -13.2863619488))
            ThreePointArc((-10.5230861195, -13.2863619488), (-9.2618603214, -13.6006676835), (-7.9941006882, -13.8874849093))
            ThreePointArc((-7.9941006882, -13.8874849093), (-7.8690501416, -13.7755079493), (-7.7500222504, -13.6571490043))
        make_face()
        with BuildLine():
            ThreePointArc((-11.9189886514, -10.9899866588), (-10.9940718567, -11.2075300608), (-10.0728497405, -11.4402230378))
            Line((-10.0728497405, -11.4402230378), (-11.9111114468, -10.9598128319))
            ThreePointArc((-11.9111114468, -10.9598128319), (-11.9150520162, -10.9748992319), (-11.9189886514, -10.9899866588))
        make_face()
        with BuildLine():
            ThreePointArc((-10.5230861195, -13.2863619488), (-10.6643076305, -13.9264868582), (-10.7982724135, -14.5681696862))
            ThreePointArc((-10.7982724135, -14.5681696862), (-9.3154159061, -14.560572742), (-7.9941006882, -13.8874849093))
            ThreePointArc((-7.9941006882, -13.8874849093), (-9.2618603214, -13.6006676835), (-10.5230861195, -13.2863619488))
        make_face()
        with BuildLine():
            ThreePointArc((-12.4625142647, -8.9270274978), (-12.3762338407, -9.022292149), (-12.2897757069, -9.1173955477))
            ThreePointArc((-12.2897757069, -9.1173955477), (-12.2215881949, -9.0541779116), (-12.1515987927, -8.9929611664))
            ThreePointArc((-12.1515987927, -8.9929611664), (-12.3070127215, -8.9597877558), (-12.4625142647, -8.9270274978))
        make_face()
        with BuildLine():
            ThreePointArc((-7.625587869, -9.3614739856), (-7.5924695565, -9.2063198731), (-7.5597630163, -9.051078437))
            ThreePointArc((-7.5597630163, -9.051078437), (-7.6548806672, -9.1371958925), (-7.7498370678, -9.2234911162))
            ThreePointArc((-7.7498370678, -9.2234911162), (-7.686714869, -9.2915842443), (-7.625587869, -9.3614739856))
        make_face()
        with BuildLine():
            ThreePointArc((53.8177210355, 10.6661625852), (53.5276959283, 10.2487029623), (53.2341325227, 9.8337238948))
            ThreePointArc((53.2341325227, 9.8337238948), (54.578287687, 10.7249830274), (55.0985068765, 12.2515700516))
            ThreePointArc((55.0985068765, 12.2515700516), (51.4475166308, 14.4708540474), (51.1583297131, 10.2080706662))
            ThreePointArc((51.1583297131, 10.2080706662), (51.3063190398, 10.4096215716), (51.4534364992, 10.6118097547))
            ThreePointArc((51.4534364992, 10.6118097547), (51.6738828325, 14.0250046789), (54.5985068765, 12.2515700516))
            ThreePointArc((54.5985068765, 12.2515700516), (54.3927237416, 11.3679491821), (53.8177210355, 10.6661625852))
        make_face()
        with BuildLine():
            ThreePointArc((51.1583297131, 10.2080706662), (52.1548181767, 9.7912569947), (53.2341325227, 9.8337238948))
            ThreePointArc((53.2341325227, 9.8337238948), (53.5276959283, 10.2487029623), (53.8177210355, 10.6661625852))
            ThreePointArc((53.8177210355, 10.6661625852), (52.6444729797, 10.252098342), (51.4534364992, 10.6118097547))
            ThreePointArc((51.4534364992, 10.6118097547), (51.3063190398, 10.4096215716), (51.1583297131, 10.2080706662))
        make_face()
        with BuildLine():
            ThreePointArc((-7.625587869, -9.3614739856), (-7.9124050948, -10.6292336188), (-8.2267108295, -11.8904594168))
            ThreePointArc((-8.2267108295, -11.8904594168), (-7.5865859201, -12.0316809278), (-6.9449030921, -12.1656457109))
            ThreePointArc((-6.9449030921, -12.1656457109), (-6.8827077662, -11.8053017608), (-6.8618859771, -11.4402230378))
            ThreePointArc((-6.8618859771, -11.4402230378), (-7.0588526039, -10.3329247264), (-7.625587869, -9.3614739856))
        make_face()
        with BuildLine():
            ThreePointArc((-12.1515987927, -8.9929611664), (-10.8838391595, -9.2797783922), (-9.6226133615, -9.5940841269))
            ThreePointArc((-9.6226133615, -9.5940841269), (-9.4813918505, -8.9539592174), (-9.3474270674, -8.3122763895))
            ThreePointArc((-9.3474270674, -8.3122763895), (-10.8302835749, -8.3198733337), (-12.1515987927, -8.9929611664))
        make_face()
    extrude(amount=F1_DEPTH)


solid = f1.part
